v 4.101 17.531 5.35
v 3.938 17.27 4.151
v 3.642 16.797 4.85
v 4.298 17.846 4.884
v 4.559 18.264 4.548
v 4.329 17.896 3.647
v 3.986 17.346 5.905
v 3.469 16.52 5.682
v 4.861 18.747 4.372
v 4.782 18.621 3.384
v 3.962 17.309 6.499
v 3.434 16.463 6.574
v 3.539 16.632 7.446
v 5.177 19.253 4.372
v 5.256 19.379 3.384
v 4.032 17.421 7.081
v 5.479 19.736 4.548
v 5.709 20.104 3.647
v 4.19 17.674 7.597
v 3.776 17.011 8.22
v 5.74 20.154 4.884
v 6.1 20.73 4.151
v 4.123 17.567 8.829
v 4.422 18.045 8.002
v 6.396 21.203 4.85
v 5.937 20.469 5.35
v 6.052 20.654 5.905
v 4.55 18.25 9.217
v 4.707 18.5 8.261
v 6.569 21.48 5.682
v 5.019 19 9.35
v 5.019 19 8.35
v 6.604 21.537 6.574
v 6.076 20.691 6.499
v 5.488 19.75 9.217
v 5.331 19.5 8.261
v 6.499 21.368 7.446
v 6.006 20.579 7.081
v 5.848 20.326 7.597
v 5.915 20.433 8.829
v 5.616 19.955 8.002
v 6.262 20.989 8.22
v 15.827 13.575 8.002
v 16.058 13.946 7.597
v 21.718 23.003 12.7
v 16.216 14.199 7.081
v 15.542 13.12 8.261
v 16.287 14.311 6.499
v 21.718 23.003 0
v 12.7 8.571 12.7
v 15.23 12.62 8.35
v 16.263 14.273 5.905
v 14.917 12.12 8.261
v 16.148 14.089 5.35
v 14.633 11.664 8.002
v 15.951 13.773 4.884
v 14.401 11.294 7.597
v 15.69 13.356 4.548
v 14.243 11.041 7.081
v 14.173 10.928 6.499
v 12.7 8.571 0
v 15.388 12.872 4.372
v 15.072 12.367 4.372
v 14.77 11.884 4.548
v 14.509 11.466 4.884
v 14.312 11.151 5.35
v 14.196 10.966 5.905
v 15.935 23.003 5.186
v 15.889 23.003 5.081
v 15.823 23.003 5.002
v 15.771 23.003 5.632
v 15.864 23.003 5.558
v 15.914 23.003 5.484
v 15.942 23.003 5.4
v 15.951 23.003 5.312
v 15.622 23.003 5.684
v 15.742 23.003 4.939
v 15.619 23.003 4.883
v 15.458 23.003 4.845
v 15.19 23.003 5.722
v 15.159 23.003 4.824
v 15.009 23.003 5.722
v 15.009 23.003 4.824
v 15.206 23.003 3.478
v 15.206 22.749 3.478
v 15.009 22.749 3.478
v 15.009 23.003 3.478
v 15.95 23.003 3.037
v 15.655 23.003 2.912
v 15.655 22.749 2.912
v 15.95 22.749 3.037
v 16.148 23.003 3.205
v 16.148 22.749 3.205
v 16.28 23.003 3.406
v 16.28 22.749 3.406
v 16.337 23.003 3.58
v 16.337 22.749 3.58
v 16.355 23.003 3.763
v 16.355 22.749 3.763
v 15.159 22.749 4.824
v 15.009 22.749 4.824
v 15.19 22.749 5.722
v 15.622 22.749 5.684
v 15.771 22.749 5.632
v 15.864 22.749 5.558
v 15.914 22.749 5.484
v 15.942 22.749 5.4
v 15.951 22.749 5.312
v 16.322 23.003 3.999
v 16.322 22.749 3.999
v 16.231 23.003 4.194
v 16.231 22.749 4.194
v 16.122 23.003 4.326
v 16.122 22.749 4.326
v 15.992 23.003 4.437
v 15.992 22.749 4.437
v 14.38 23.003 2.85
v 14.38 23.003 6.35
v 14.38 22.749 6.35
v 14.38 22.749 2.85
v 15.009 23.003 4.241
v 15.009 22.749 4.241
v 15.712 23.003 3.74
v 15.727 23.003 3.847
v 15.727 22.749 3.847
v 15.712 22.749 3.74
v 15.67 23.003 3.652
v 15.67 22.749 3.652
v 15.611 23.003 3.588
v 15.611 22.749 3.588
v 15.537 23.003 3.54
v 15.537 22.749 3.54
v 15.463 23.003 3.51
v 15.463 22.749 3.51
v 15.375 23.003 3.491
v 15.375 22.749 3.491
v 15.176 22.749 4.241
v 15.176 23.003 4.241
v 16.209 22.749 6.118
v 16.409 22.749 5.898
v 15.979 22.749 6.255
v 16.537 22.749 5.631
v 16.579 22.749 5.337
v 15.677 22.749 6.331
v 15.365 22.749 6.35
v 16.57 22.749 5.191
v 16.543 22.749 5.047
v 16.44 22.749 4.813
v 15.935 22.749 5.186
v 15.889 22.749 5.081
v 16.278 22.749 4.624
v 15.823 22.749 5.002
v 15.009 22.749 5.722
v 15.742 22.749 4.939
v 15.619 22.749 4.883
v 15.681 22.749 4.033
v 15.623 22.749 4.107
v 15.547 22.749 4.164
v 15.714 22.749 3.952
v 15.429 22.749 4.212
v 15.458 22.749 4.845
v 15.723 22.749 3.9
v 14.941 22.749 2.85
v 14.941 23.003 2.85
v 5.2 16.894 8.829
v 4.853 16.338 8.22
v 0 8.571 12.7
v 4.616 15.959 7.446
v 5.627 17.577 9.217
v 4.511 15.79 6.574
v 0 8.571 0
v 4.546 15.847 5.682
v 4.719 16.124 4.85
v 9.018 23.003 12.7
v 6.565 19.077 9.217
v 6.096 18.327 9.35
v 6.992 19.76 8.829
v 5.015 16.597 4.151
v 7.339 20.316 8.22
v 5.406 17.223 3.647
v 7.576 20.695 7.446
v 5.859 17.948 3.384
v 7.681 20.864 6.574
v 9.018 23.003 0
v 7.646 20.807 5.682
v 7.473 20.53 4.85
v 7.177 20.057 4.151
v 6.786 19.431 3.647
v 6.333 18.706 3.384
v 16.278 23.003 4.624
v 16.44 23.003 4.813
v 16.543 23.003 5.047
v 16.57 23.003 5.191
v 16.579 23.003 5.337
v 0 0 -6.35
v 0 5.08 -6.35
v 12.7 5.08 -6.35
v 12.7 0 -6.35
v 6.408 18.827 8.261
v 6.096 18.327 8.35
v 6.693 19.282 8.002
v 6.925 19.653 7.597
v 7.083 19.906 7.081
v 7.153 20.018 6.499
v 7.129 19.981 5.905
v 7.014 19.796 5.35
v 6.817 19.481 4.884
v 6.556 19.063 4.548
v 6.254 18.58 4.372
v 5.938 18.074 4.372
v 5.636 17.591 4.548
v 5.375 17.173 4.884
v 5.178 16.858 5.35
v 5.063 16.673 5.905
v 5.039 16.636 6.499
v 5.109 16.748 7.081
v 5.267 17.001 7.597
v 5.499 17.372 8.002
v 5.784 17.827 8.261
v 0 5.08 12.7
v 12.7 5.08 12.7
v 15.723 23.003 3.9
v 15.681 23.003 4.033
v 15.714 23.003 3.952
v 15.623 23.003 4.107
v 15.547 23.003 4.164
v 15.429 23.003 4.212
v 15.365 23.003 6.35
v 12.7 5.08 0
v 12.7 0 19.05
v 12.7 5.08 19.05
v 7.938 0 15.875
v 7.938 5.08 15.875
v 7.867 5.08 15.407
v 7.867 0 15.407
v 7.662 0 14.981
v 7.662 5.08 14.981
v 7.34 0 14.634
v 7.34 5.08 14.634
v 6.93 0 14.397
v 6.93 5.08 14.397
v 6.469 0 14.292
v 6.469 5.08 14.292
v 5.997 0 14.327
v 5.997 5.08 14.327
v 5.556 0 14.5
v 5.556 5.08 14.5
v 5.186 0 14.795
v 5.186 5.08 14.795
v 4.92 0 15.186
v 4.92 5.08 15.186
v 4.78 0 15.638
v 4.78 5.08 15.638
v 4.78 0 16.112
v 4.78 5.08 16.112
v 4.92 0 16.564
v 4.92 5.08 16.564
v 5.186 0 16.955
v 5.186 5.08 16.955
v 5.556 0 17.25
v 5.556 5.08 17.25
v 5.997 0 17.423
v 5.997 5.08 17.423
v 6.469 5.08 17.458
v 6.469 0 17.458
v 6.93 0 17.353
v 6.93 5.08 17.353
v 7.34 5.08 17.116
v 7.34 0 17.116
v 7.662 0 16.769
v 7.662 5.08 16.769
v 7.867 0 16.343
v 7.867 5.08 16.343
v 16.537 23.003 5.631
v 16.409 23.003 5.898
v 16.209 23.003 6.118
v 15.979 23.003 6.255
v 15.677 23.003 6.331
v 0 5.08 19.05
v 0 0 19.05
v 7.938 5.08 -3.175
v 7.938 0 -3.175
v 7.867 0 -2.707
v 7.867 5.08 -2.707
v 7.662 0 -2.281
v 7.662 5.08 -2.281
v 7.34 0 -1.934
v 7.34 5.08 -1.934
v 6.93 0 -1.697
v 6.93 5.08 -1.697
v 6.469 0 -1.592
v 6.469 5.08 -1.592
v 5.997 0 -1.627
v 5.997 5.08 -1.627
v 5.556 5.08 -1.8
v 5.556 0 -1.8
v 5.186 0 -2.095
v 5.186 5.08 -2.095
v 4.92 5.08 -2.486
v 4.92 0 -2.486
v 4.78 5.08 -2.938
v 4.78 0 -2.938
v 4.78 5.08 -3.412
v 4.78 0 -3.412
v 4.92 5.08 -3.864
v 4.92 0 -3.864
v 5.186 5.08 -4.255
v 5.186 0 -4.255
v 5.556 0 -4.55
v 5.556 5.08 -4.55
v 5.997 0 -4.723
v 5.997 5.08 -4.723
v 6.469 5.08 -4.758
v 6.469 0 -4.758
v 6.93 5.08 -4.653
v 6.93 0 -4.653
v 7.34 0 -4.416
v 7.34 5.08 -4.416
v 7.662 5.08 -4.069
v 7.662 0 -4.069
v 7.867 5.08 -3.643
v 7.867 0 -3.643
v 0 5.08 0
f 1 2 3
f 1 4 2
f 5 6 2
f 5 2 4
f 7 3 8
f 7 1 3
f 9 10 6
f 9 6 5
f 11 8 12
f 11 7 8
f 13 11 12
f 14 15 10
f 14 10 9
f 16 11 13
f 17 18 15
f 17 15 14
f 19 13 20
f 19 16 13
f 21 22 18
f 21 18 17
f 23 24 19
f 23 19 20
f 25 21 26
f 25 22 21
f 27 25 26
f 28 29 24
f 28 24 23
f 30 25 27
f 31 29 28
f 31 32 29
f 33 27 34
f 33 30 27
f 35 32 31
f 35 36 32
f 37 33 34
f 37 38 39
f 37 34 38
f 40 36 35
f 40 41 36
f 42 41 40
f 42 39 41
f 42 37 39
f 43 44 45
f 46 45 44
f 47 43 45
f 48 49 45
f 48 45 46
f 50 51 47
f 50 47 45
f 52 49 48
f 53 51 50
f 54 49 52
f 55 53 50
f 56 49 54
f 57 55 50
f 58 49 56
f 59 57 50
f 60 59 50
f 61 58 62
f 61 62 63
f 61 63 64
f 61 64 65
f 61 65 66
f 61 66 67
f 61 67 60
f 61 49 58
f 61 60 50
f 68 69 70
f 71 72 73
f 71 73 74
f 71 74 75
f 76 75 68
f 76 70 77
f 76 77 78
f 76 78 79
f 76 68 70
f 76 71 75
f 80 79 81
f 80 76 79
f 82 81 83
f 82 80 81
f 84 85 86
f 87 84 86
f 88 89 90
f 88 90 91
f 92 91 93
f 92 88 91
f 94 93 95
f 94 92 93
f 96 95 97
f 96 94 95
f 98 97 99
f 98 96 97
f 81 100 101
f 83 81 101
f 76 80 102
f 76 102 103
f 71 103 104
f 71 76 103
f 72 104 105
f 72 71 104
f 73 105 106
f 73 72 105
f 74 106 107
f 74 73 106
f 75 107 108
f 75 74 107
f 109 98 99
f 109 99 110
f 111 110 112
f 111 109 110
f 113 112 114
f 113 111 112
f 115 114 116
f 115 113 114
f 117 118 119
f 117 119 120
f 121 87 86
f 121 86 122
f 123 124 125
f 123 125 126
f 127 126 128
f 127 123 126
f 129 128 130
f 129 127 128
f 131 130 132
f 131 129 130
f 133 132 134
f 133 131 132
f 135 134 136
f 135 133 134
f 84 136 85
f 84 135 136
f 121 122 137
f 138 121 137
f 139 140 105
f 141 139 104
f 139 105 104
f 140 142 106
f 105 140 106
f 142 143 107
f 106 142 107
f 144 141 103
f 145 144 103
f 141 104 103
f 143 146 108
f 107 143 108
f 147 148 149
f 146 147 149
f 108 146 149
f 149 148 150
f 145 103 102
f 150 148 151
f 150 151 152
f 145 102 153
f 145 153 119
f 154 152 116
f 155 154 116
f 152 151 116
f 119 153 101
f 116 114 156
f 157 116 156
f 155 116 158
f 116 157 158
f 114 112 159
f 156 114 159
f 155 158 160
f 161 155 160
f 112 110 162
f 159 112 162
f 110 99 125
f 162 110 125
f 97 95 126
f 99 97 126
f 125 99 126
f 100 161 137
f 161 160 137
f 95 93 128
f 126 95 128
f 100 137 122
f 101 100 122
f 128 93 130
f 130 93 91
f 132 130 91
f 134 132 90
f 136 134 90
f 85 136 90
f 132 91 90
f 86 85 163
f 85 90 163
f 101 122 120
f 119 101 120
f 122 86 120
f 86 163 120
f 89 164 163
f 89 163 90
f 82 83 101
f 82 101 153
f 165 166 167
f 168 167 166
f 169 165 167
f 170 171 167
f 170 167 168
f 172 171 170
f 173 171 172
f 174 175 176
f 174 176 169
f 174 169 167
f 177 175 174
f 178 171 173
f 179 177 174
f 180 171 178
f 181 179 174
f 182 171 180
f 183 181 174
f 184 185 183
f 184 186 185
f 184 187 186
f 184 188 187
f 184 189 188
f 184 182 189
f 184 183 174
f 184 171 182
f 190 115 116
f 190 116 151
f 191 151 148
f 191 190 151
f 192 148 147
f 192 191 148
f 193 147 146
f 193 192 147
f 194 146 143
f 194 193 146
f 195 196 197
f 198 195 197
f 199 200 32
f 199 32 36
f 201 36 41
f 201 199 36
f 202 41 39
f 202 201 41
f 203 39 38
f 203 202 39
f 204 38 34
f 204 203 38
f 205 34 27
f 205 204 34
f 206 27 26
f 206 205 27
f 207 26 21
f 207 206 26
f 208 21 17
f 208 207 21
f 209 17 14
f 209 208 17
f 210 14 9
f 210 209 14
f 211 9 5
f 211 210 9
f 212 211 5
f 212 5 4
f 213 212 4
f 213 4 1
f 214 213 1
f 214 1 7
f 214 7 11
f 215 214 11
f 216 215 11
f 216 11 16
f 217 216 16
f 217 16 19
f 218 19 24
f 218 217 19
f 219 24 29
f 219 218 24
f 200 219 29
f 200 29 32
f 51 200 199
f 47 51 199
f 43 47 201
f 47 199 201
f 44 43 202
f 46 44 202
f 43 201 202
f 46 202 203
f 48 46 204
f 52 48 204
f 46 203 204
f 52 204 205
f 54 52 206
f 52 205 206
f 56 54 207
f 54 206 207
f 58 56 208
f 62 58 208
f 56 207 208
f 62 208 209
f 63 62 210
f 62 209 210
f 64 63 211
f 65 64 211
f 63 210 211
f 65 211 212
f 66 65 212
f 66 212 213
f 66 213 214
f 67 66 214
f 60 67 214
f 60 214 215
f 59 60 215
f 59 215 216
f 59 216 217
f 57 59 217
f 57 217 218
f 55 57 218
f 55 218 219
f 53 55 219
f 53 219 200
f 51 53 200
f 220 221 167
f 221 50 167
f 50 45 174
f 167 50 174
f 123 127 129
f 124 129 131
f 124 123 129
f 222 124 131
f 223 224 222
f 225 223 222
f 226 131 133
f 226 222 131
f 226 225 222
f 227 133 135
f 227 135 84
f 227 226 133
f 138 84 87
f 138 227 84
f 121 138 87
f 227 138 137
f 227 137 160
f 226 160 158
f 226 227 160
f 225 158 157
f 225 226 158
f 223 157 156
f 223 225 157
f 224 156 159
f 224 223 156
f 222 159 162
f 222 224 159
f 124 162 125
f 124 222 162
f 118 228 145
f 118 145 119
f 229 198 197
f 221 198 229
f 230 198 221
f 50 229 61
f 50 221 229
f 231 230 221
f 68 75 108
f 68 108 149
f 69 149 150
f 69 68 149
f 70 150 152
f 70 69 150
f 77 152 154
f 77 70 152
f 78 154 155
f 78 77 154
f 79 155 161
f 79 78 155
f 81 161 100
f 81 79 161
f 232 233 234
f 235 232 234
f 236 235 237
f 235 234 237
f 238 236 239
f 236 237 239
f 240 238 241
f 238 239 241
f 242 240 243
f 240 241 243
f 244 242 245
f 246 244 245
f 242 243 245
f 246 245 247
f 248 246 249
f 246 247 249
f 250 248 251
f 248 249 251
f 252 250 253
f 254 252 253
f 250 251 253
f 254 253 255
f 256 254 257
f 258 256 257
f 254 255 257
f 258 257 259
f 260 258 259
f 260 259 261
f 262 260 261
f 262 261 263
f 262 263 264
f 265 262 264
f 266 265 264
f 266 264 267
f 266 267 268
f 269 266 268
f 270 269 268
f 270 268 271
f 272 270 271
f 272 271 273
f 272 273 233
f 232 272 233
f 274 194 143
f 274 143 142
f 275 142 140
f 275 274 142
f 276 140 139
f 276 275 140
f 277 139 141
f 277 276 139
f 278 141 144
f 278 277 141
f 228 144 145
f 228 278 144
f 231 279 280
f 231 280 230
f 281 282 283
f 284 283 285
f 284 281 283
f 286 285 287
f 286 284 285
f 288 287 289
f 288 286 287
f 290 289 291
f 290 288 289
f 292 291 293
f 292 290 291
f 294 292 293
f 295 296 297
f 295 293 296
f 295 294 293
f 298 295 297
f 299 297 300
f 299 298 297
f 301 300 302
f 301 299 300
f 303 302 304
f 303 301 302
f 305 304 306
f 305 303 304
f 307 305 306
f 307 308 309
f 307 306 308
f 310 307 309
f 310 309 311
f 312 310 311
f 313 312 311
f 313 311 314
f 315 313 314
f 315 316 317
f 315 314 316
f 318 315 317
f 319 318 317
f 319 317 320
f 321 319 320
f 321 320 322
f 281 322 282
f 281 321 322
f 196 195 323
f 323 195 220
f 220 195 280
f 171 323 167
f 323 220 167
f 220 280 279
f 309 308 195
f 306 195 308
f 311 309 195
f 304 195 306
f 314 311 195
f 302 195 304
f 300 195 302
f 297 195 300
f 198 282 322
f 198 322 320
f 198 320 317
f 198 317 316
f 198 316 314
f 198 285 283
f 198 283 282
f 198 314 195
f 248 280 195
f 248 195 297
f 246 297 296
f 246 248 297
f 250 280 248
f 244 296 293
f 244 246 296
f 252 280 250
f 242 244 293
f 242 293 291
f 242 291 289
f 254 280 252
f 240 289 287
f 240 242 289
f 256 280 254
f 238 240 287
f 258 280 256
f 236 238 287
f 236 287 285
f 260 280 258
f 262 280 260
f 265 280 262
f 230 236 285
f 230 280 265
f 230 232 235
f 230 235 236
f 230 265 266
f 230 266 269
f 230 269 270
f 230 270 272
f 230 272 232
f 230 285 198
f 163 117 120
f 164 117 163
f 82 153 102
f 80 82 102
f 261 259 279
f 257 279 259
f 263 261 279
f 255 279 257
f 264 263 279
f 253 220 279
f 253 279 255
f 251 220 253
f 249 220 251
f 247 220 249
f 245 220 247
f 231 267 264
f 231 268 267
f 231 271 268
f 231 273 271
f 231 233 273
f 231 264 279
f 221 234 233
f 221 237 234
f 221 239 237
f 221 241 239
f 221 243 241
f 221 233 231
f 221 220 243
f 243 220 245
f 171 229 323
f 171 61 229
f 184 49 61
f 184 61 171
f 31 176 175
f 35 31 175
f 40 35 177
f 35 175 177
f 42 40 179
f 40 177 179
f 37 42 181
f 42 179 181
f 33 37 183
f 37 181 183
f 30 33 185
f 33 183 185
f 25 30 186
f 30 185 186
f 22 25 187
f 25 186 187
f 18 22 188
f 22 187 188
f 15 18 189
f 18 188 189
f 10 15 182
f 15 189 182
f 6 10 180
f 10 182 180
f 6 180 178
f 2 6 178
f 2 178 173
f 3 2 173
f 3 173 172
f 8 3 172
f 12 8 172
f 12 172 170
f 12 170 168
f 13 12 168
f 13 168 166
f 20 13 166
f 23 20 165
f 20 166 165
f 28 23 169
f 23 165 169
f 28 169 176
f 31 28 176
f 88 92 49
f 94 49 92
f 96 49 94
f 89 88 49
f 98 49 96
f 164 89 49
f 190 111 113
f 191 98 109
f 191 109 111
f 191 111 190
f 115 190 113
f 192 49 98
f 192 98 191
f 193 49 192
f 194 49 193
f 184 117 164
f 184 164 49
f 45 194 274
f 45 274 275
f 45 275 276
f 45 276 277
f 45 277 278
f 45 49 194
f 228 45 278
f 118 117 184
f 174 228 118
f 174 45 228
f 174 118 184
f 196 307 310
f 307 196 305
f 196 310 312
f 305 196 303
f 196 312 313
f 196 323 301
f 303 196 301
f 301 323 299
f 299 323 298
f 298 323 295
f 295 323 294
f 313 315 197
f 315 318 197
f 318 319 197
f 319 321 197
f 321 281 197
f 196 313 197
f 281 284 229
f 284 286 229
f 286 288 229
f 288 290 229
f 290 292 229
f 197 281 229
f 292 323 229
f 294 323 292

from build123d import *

# Parameters (mm, degrees)
BOSS_EXTRUDE3_DEPTH = 12.7
SKETCH8_R           = 2
CUT_EXTRUDE5_DEPTH  = 12.7
CUT_EXTRUDE7_DEPTH  = 12.7
SKETCH10_W          = 12.7
SKETCH10_H          = 5.08
BOSS_EXTRUDE4_DEPTH = 6.35
SKETCH11_R          = 1.5875
CUT_EXTRUDE8_DEPTH  = 12.7
SKETCH13_R          = 3
SKETCH13_R_2        = 2
BOSS_EXTRUDE5_DEPTH = 1.27
CUT_EXTRUDE10_DEPTH = 0.254


with BuildPart() as part:
    # Sketch7 → Boss-Extrude3 (new body)
    with BuildSketch(Plane.XY):
        Polygon((0, 8.571363245), (12.192, 28.082641823), (24.892, 28.082641823), (12.7, 8.571363245), (12.7, 0), (0, 0), align=None)
    extrude(amount=BOSS_EXTRUDE3_DEPTH)

    # Sketch8 → Cut-Extrude5 (cut)
    with BuildSketch(Plane(origin=(-3.851945127, 2.406962455, 0), x_dir=(0, 0, 1), z_dir=(-0.848048096, 0.529919264, 0))):
        with Locations((6.35, 18.772567442)):
            Circle(SKETCH8_R)
    extrude(amount=-CUT_EXTRUDE5_DEPTH, mode=Mode.SUBTRACT)

    # Sketch9 → Cut-Extrude7 (cut)
    with BuildSketch(Plane.XY.offset(12.7)):
        Polygon((21.717663692, 23.002641823), (9.017663692, 23.002641823), (12.192, 28.082641823), (24.892, 28.082641823), align=None)
    extrude(amount=-CUT_EXTRUDE7_DEPTH, mode=Mode.SUBTRACT)

    # Sketch10 → Boss-Extrude4 (add)
    with BuildSketch(Plane.XY.offset(12.7)):
        with Locations((6.35, 2.54)):
            Rectangle(SKETCH10_W, SKETCH10_H)
    boss_extrude4 = extrude(amount=BOSS_EXTRUDE4_DEPTH)

    # Sketch11 → Cut-Extrude8 (cut)
    with BuildSketch(Plane(origin=(0, 5.08, 0), x_dir=(1, 0, 0), z_dir=(0, 1, 0))):
        with Locations((6.35, -15.875)):
            Circle(SKETCH11_R)
    cut_extrude8 = extrude(amount=-CUT_EXTRUDE8_DEPTH, mode=Mode.SUBTRACT)

    # Mirror2: Boss-Extrude4, Cut-Extrude8 across plane
    add(boss_extrude4.mirror(Plane.XY.offset(6.35)))
    add(cut_extrude8.mirror(Plane.XY.offset(6.35)), mode=Mode.SUBTRACT)

    # Sketch13 → Boss-Extrude5 (add)
    with BuildSketch(Plane(origin=(-3.851945127, 2.406962455, 0), x_dir=(0, 0, 1), z_dir=(-0.848048096, 0.529919264, 0))):
        with Locations((6.35, 18.772567442)):
            Circle(SKETCH13_R)
        with Locations((6.35, 18.772567442)):
            Circle(SKETCH13_R_2, mode=Mode.SUBTRACT)
    extrude(amount=BOSS_EXTRUDE5_DEPTH)

    # Sketch17 → Cut-Extrude10 (cut)
    with BuildSketch(Plane(origin=(0, 23.002641823, 0), x_dir=(1, 0, 0), z_dir=(0, 1, 0))):
        with BuildLine():
            Line((14.380484205, -6.35), (14.380484205, -2.85))
            Line((14.380484205, -2.85), (14.941381641, -2.85))
            add(Edge.make_bspline(
                [(14.941381641, -2.85), (14.980647969, -2.849995519), (15.056627568, -2.849986848), (15.166246302, -2.853836298), (15.267908419, -2.858815992), (15.361290393, -2.864387113), (15.446551165, -2.873987267), (15.523561083, -2.88410478), (15.592474012, -2.896305878), (15.635079132, -2.907250641), (15.655123628, -2.91239984)],
                knots=[0, 0, 0, 0, 0.000117791, 0.000227922, 0.000329003, 0.000423165, 0.000508489, 0.000586326, 0.000656186, 0.000718254, 0.000718254, 0.000718254, 0.000718254], degree=3))
            add(Edge.make_bspline(
                [(15.655123628, -2.91239984), (15.681444087, -2.919662877), (15.733093276, -2.933915288), (15.807071397, -2.962698647), (15.877249964, -2.994693392), (15.943543291, -3.031193412), (16.005544311, -3.072639364), (16.063017398, -3.119360176), (16.117202106, -3.169480477), (16.166174458, -3.224397106), (16.210437395, -3.282426696), (16.248893952, -3.343554044), (16.28230777, -3.406844471), (16.309047578, -3.473094446), (16.32919552, -3.54199887), (16.343931641, -3.61326351), (16.353482643, -3.687113865), (16.354385087, -3.737356675), (16.354843179, -3.762860577)],
                knots=[0, 0, 0, 0, 8.1863e-05, 0.000160642, 0.000237816, 0.000313134, 0.000387417, 0.000461218, 0.000535129, 0.000608609, 0.000681668, 0.000753832, 0.000825019, 0.000896106, 0.000967761, 0.001040089, 0.001114269, 0.001190743, 0.001190743, 0.001190743, 0.001190743], degree=3))
            add(Edge.make_bspline(
                [(16.354843179, -3.762860577), (16.353645404, -3.795626396), (16.351287729, -3.860121885), (16.336226745, -3.954854089), (16.307985053, -4.044389639), (16.271031486, -4.130378639), (16.220786188, -4.212500352), (16.156984378, -4.290715729), (16.080659434, -4.367433141), (16.022113989, -4.413420054), (15.99166209, -4.437339744)],
                knots=[0, 0, 0, 0, 9.8317e-05, 0.000193525, 0.000286672, 0.000379289, 0.00047368, 0.000574417, 0.000681503, 0.000797579, 0.000797579, 0.000797579, 0.000797579], degree=3))
            add(Edge.make_bspline(
                [(15.99166209, -4.437339744), (16.016338848, -4.449937015), (16.064723145, -4.474636779), (16.133414631, -4.515235817), (16.197015449, -4.558418043), (16.255810766, -4.603314613), (16.308567282, -4.651828759), (16.357463403, -4.701165027), (16.400086847, -4.754150182), (16.438202016, -4.808895731), (16.471331101, -4.866194396), (16.500182881, -4.925949414), (16.524552945, -4.988364919), (16.545190145, -5.053123267), (16.560581374, -5.120447198), (16.570616783, -5.190360788), (16.57830052, -5.262625597), (16.578898242, -5.311850581), (16.579202154, -5.336879006)],
                knots=[0, 0, 0, 0, 8.3106e-05, 0.000162948, 0.000239177, 0.000313644, 0.000384624, 0.000454039, 0.000521819, 0.000588334, 0.000653992, 0.000720158, 0.00078721, 0.000854842, 0.000923894, 0.000994098, 0.001066653, 0.001141702, 0.001141702, 0.001141702, 0.001141702], degree=3))
            add(Edge.make_bspline(
                [(16.579202154, -5.336879006), (16.577229969, -5.384681869), (16.573337872, -5.479020625), (16.544880751, -5.617531587), (16.495545146, -5.748852541), (16.429297601, -5.872461563), (16.34766788, -5.984780374), (16.25381711, -6.083170677), (16.148690152, -6.166455884), (16.051697827, -6.222666938), (15.967807104, -6.260389811), (15.898321986, -6.28371247), (15.823696442, -6.305318547), (15.742563511, -6.32049078), (15.656394023, -6.334378075), (15.564347819, -6.34295238), (15.466596934, -6.348762974), (15.3994574, -6.349579322), (15.364859205, -6.35)],
                knots=[0, 0, 0, 0, 0.000143365, 0.000282931, 0.000422024, 0.000562867, 0.000702406, 0.000837288, 0.000969562, 0.001103403, 0.001172455, 0.001245183, 0.001323096, 0.001405322, 0.001492583, 0.001584881, 0.001682498, 0.001786285, 0.001786285, 0.001786285, 0.001786285], degree=3))
            Line((15.364859205, -6.35), (14.380484205, -6.35))
        make_face()
        with BuildLine():
            Line((15.008689333, -3.478205128), (15.008689333, -4.241025641))
            Line((15.008689333, -4.241025641), (15.175556321, -4.241025641))
            add(Edge.make_bspline(
                [(15.175556321, -4.241025641), (15.198235043, -4.240827874), (15.242014945, -4.240446097), (15.305250369, -4.235528937), (15.364049102, -4.227139958), (15.418188132, -4.215435223), (15.468171784, -4.200571914), (15.513680747, -4.182688154), (15.554514928, -4.160868022), (15.601954802, -4.128365973), (15.65210217, -4.080537752), (15.696246334, -4.011439977), (15.722246952, -3.9319778), (15.725142719, -3.875934919), (15.726638051, -3.846995192)],
                knots=[0, 0, 0, 0, 6.8023e-05, 0.000131315, 0.000190113, 0.000246084, 0.000297324, 0.000346407, 0.000392516, 0.000435884, 0.000518691, 0.000598437, 0.000679585, 0.000766233, 0.000766233, 0.000766233, 0.000766233], degree=3))
            add(Edge.make_bspline(
                [(15.726638051, -3.846995192), (15.725441512, -3.81988833), (15.723128051, -3.7674783), (15.696948772, -3.693889951), (15.656287176, -3.628675613), (15.608280446, -3.584041731), (15.563072782, -3.553558106), (15.524363206, -3.533485938), (15.481876539, -3.515517537), (15.434790286, -3.50177846), (15.383373334, -3.491469141), (15.327875445, -3.48389818), (15.268200865, -3.478745062), (15.226983506, -3.478388967), (15.205704558, -3.478205128)],
                knots=[0, 0, 0, 0, 8.0997e-05, 0.000156604, 0.000231296, 0.000309653, 0.000351072, 0.000394666, 0.000440239, 0.000489262, 0.000541514, 0.000597437, 0.000657234, 0.000721051, 0.000721051, 0.000721051, 0.000721051], degree=3))
            Line((15.205704558, -3.478205128), (15.008689333, -3.478205128))
        make_face(mode=Mode.SUBTRACT)
        with BuildLine():
            Line((15.008689333, -4.824358974), (15.008689333, -5.721794872))
            Line((15.008689333, -5.721794872), (15.189578756, -5.721794872))
            add(Edge.make_bspline(
                [(15.189578756, -5.721794872), (15.225340826, -5.721590564), (15.294097866, -5.721197758), (15.392592205, -5.716451722), (15.482148183, -5.707897829), (15.56252851, -5.697218983), (15.633856304, -5.682750816), (15.695890459, -5.664356397), (15.749481695, -5.644119331), (15.794308675, -5.619124153), (15.830929749, -5.590035963), (15.863976429, -5.560307135), (15.890920633, -5.526012123), (15.91223939, -5.488623117), (15.930690736, -5.449068886), (15.941819286, -5.405804853), (15.950292172, -5.36011326), (15.950758458, -5.328509373), (15.950997026, -5.312339744)],
                knots=[0, 0, 0, 0, 0.000107281, 0.000206261, 0.0002957, 0.000377105, 0.000449433, 0.000513769, 0.000571055, 0.000620973, 0.00066697, 0.000711118, 0.000754041, 0.00079709, 0.000840088, 0.000884486, 0.000930707, 0.00097913, 0.00097913, 0.00097913, 0.00097913], degree=3))
            add(Edge.make_bspline(
                [(15.950997026, -5.312339744), (15.950470915, -5.293849518), (15.949446194, -5.257835532), (15.941077284, -5.205197249), (15.925868241, -5.156055919), (15.906711709, -5.109154932), (15.880054377, -5.066173507), (15.848373048, -5.02562422), (15.810093916, -4.988880195), (15.767046798, -4.953719015), (15.716836597, -4.922933498), (15.659439756, -4.896221608), (15.594544464, -4.873912821), (15.5219497, -4.856150551), (15.441973715, -4.841075958), (15.354032772, -4.832074761), (15.258859273, -4.825380176), (15.19286442, -4.82470711), (15.158729397, -4.824358974)],
                knots=[0, 0, 0, 0, 5.546e-05, 0.00010802, 0.00015926, 0.000209526, 0.000259547, 0.000310464, 0.000363513, 0.000418371, 0.000476935, 0.000539665, 0.000607959, 0.000682439, 0.000763712, 0.0008519, 0.000947461, 0.001049847, 0.001049847, 0.001049847, 0.001049847], degree=3))
            Line((15.158729397, -4.824358974), (15.008689333, -4.824358974))
        make_face(mode=Mode.SUBTRACT)
    extrude(amount=-CUT_EXTRUDE10_DEPTH, mode=Mode.SUBTRACT)


solid = part.part
